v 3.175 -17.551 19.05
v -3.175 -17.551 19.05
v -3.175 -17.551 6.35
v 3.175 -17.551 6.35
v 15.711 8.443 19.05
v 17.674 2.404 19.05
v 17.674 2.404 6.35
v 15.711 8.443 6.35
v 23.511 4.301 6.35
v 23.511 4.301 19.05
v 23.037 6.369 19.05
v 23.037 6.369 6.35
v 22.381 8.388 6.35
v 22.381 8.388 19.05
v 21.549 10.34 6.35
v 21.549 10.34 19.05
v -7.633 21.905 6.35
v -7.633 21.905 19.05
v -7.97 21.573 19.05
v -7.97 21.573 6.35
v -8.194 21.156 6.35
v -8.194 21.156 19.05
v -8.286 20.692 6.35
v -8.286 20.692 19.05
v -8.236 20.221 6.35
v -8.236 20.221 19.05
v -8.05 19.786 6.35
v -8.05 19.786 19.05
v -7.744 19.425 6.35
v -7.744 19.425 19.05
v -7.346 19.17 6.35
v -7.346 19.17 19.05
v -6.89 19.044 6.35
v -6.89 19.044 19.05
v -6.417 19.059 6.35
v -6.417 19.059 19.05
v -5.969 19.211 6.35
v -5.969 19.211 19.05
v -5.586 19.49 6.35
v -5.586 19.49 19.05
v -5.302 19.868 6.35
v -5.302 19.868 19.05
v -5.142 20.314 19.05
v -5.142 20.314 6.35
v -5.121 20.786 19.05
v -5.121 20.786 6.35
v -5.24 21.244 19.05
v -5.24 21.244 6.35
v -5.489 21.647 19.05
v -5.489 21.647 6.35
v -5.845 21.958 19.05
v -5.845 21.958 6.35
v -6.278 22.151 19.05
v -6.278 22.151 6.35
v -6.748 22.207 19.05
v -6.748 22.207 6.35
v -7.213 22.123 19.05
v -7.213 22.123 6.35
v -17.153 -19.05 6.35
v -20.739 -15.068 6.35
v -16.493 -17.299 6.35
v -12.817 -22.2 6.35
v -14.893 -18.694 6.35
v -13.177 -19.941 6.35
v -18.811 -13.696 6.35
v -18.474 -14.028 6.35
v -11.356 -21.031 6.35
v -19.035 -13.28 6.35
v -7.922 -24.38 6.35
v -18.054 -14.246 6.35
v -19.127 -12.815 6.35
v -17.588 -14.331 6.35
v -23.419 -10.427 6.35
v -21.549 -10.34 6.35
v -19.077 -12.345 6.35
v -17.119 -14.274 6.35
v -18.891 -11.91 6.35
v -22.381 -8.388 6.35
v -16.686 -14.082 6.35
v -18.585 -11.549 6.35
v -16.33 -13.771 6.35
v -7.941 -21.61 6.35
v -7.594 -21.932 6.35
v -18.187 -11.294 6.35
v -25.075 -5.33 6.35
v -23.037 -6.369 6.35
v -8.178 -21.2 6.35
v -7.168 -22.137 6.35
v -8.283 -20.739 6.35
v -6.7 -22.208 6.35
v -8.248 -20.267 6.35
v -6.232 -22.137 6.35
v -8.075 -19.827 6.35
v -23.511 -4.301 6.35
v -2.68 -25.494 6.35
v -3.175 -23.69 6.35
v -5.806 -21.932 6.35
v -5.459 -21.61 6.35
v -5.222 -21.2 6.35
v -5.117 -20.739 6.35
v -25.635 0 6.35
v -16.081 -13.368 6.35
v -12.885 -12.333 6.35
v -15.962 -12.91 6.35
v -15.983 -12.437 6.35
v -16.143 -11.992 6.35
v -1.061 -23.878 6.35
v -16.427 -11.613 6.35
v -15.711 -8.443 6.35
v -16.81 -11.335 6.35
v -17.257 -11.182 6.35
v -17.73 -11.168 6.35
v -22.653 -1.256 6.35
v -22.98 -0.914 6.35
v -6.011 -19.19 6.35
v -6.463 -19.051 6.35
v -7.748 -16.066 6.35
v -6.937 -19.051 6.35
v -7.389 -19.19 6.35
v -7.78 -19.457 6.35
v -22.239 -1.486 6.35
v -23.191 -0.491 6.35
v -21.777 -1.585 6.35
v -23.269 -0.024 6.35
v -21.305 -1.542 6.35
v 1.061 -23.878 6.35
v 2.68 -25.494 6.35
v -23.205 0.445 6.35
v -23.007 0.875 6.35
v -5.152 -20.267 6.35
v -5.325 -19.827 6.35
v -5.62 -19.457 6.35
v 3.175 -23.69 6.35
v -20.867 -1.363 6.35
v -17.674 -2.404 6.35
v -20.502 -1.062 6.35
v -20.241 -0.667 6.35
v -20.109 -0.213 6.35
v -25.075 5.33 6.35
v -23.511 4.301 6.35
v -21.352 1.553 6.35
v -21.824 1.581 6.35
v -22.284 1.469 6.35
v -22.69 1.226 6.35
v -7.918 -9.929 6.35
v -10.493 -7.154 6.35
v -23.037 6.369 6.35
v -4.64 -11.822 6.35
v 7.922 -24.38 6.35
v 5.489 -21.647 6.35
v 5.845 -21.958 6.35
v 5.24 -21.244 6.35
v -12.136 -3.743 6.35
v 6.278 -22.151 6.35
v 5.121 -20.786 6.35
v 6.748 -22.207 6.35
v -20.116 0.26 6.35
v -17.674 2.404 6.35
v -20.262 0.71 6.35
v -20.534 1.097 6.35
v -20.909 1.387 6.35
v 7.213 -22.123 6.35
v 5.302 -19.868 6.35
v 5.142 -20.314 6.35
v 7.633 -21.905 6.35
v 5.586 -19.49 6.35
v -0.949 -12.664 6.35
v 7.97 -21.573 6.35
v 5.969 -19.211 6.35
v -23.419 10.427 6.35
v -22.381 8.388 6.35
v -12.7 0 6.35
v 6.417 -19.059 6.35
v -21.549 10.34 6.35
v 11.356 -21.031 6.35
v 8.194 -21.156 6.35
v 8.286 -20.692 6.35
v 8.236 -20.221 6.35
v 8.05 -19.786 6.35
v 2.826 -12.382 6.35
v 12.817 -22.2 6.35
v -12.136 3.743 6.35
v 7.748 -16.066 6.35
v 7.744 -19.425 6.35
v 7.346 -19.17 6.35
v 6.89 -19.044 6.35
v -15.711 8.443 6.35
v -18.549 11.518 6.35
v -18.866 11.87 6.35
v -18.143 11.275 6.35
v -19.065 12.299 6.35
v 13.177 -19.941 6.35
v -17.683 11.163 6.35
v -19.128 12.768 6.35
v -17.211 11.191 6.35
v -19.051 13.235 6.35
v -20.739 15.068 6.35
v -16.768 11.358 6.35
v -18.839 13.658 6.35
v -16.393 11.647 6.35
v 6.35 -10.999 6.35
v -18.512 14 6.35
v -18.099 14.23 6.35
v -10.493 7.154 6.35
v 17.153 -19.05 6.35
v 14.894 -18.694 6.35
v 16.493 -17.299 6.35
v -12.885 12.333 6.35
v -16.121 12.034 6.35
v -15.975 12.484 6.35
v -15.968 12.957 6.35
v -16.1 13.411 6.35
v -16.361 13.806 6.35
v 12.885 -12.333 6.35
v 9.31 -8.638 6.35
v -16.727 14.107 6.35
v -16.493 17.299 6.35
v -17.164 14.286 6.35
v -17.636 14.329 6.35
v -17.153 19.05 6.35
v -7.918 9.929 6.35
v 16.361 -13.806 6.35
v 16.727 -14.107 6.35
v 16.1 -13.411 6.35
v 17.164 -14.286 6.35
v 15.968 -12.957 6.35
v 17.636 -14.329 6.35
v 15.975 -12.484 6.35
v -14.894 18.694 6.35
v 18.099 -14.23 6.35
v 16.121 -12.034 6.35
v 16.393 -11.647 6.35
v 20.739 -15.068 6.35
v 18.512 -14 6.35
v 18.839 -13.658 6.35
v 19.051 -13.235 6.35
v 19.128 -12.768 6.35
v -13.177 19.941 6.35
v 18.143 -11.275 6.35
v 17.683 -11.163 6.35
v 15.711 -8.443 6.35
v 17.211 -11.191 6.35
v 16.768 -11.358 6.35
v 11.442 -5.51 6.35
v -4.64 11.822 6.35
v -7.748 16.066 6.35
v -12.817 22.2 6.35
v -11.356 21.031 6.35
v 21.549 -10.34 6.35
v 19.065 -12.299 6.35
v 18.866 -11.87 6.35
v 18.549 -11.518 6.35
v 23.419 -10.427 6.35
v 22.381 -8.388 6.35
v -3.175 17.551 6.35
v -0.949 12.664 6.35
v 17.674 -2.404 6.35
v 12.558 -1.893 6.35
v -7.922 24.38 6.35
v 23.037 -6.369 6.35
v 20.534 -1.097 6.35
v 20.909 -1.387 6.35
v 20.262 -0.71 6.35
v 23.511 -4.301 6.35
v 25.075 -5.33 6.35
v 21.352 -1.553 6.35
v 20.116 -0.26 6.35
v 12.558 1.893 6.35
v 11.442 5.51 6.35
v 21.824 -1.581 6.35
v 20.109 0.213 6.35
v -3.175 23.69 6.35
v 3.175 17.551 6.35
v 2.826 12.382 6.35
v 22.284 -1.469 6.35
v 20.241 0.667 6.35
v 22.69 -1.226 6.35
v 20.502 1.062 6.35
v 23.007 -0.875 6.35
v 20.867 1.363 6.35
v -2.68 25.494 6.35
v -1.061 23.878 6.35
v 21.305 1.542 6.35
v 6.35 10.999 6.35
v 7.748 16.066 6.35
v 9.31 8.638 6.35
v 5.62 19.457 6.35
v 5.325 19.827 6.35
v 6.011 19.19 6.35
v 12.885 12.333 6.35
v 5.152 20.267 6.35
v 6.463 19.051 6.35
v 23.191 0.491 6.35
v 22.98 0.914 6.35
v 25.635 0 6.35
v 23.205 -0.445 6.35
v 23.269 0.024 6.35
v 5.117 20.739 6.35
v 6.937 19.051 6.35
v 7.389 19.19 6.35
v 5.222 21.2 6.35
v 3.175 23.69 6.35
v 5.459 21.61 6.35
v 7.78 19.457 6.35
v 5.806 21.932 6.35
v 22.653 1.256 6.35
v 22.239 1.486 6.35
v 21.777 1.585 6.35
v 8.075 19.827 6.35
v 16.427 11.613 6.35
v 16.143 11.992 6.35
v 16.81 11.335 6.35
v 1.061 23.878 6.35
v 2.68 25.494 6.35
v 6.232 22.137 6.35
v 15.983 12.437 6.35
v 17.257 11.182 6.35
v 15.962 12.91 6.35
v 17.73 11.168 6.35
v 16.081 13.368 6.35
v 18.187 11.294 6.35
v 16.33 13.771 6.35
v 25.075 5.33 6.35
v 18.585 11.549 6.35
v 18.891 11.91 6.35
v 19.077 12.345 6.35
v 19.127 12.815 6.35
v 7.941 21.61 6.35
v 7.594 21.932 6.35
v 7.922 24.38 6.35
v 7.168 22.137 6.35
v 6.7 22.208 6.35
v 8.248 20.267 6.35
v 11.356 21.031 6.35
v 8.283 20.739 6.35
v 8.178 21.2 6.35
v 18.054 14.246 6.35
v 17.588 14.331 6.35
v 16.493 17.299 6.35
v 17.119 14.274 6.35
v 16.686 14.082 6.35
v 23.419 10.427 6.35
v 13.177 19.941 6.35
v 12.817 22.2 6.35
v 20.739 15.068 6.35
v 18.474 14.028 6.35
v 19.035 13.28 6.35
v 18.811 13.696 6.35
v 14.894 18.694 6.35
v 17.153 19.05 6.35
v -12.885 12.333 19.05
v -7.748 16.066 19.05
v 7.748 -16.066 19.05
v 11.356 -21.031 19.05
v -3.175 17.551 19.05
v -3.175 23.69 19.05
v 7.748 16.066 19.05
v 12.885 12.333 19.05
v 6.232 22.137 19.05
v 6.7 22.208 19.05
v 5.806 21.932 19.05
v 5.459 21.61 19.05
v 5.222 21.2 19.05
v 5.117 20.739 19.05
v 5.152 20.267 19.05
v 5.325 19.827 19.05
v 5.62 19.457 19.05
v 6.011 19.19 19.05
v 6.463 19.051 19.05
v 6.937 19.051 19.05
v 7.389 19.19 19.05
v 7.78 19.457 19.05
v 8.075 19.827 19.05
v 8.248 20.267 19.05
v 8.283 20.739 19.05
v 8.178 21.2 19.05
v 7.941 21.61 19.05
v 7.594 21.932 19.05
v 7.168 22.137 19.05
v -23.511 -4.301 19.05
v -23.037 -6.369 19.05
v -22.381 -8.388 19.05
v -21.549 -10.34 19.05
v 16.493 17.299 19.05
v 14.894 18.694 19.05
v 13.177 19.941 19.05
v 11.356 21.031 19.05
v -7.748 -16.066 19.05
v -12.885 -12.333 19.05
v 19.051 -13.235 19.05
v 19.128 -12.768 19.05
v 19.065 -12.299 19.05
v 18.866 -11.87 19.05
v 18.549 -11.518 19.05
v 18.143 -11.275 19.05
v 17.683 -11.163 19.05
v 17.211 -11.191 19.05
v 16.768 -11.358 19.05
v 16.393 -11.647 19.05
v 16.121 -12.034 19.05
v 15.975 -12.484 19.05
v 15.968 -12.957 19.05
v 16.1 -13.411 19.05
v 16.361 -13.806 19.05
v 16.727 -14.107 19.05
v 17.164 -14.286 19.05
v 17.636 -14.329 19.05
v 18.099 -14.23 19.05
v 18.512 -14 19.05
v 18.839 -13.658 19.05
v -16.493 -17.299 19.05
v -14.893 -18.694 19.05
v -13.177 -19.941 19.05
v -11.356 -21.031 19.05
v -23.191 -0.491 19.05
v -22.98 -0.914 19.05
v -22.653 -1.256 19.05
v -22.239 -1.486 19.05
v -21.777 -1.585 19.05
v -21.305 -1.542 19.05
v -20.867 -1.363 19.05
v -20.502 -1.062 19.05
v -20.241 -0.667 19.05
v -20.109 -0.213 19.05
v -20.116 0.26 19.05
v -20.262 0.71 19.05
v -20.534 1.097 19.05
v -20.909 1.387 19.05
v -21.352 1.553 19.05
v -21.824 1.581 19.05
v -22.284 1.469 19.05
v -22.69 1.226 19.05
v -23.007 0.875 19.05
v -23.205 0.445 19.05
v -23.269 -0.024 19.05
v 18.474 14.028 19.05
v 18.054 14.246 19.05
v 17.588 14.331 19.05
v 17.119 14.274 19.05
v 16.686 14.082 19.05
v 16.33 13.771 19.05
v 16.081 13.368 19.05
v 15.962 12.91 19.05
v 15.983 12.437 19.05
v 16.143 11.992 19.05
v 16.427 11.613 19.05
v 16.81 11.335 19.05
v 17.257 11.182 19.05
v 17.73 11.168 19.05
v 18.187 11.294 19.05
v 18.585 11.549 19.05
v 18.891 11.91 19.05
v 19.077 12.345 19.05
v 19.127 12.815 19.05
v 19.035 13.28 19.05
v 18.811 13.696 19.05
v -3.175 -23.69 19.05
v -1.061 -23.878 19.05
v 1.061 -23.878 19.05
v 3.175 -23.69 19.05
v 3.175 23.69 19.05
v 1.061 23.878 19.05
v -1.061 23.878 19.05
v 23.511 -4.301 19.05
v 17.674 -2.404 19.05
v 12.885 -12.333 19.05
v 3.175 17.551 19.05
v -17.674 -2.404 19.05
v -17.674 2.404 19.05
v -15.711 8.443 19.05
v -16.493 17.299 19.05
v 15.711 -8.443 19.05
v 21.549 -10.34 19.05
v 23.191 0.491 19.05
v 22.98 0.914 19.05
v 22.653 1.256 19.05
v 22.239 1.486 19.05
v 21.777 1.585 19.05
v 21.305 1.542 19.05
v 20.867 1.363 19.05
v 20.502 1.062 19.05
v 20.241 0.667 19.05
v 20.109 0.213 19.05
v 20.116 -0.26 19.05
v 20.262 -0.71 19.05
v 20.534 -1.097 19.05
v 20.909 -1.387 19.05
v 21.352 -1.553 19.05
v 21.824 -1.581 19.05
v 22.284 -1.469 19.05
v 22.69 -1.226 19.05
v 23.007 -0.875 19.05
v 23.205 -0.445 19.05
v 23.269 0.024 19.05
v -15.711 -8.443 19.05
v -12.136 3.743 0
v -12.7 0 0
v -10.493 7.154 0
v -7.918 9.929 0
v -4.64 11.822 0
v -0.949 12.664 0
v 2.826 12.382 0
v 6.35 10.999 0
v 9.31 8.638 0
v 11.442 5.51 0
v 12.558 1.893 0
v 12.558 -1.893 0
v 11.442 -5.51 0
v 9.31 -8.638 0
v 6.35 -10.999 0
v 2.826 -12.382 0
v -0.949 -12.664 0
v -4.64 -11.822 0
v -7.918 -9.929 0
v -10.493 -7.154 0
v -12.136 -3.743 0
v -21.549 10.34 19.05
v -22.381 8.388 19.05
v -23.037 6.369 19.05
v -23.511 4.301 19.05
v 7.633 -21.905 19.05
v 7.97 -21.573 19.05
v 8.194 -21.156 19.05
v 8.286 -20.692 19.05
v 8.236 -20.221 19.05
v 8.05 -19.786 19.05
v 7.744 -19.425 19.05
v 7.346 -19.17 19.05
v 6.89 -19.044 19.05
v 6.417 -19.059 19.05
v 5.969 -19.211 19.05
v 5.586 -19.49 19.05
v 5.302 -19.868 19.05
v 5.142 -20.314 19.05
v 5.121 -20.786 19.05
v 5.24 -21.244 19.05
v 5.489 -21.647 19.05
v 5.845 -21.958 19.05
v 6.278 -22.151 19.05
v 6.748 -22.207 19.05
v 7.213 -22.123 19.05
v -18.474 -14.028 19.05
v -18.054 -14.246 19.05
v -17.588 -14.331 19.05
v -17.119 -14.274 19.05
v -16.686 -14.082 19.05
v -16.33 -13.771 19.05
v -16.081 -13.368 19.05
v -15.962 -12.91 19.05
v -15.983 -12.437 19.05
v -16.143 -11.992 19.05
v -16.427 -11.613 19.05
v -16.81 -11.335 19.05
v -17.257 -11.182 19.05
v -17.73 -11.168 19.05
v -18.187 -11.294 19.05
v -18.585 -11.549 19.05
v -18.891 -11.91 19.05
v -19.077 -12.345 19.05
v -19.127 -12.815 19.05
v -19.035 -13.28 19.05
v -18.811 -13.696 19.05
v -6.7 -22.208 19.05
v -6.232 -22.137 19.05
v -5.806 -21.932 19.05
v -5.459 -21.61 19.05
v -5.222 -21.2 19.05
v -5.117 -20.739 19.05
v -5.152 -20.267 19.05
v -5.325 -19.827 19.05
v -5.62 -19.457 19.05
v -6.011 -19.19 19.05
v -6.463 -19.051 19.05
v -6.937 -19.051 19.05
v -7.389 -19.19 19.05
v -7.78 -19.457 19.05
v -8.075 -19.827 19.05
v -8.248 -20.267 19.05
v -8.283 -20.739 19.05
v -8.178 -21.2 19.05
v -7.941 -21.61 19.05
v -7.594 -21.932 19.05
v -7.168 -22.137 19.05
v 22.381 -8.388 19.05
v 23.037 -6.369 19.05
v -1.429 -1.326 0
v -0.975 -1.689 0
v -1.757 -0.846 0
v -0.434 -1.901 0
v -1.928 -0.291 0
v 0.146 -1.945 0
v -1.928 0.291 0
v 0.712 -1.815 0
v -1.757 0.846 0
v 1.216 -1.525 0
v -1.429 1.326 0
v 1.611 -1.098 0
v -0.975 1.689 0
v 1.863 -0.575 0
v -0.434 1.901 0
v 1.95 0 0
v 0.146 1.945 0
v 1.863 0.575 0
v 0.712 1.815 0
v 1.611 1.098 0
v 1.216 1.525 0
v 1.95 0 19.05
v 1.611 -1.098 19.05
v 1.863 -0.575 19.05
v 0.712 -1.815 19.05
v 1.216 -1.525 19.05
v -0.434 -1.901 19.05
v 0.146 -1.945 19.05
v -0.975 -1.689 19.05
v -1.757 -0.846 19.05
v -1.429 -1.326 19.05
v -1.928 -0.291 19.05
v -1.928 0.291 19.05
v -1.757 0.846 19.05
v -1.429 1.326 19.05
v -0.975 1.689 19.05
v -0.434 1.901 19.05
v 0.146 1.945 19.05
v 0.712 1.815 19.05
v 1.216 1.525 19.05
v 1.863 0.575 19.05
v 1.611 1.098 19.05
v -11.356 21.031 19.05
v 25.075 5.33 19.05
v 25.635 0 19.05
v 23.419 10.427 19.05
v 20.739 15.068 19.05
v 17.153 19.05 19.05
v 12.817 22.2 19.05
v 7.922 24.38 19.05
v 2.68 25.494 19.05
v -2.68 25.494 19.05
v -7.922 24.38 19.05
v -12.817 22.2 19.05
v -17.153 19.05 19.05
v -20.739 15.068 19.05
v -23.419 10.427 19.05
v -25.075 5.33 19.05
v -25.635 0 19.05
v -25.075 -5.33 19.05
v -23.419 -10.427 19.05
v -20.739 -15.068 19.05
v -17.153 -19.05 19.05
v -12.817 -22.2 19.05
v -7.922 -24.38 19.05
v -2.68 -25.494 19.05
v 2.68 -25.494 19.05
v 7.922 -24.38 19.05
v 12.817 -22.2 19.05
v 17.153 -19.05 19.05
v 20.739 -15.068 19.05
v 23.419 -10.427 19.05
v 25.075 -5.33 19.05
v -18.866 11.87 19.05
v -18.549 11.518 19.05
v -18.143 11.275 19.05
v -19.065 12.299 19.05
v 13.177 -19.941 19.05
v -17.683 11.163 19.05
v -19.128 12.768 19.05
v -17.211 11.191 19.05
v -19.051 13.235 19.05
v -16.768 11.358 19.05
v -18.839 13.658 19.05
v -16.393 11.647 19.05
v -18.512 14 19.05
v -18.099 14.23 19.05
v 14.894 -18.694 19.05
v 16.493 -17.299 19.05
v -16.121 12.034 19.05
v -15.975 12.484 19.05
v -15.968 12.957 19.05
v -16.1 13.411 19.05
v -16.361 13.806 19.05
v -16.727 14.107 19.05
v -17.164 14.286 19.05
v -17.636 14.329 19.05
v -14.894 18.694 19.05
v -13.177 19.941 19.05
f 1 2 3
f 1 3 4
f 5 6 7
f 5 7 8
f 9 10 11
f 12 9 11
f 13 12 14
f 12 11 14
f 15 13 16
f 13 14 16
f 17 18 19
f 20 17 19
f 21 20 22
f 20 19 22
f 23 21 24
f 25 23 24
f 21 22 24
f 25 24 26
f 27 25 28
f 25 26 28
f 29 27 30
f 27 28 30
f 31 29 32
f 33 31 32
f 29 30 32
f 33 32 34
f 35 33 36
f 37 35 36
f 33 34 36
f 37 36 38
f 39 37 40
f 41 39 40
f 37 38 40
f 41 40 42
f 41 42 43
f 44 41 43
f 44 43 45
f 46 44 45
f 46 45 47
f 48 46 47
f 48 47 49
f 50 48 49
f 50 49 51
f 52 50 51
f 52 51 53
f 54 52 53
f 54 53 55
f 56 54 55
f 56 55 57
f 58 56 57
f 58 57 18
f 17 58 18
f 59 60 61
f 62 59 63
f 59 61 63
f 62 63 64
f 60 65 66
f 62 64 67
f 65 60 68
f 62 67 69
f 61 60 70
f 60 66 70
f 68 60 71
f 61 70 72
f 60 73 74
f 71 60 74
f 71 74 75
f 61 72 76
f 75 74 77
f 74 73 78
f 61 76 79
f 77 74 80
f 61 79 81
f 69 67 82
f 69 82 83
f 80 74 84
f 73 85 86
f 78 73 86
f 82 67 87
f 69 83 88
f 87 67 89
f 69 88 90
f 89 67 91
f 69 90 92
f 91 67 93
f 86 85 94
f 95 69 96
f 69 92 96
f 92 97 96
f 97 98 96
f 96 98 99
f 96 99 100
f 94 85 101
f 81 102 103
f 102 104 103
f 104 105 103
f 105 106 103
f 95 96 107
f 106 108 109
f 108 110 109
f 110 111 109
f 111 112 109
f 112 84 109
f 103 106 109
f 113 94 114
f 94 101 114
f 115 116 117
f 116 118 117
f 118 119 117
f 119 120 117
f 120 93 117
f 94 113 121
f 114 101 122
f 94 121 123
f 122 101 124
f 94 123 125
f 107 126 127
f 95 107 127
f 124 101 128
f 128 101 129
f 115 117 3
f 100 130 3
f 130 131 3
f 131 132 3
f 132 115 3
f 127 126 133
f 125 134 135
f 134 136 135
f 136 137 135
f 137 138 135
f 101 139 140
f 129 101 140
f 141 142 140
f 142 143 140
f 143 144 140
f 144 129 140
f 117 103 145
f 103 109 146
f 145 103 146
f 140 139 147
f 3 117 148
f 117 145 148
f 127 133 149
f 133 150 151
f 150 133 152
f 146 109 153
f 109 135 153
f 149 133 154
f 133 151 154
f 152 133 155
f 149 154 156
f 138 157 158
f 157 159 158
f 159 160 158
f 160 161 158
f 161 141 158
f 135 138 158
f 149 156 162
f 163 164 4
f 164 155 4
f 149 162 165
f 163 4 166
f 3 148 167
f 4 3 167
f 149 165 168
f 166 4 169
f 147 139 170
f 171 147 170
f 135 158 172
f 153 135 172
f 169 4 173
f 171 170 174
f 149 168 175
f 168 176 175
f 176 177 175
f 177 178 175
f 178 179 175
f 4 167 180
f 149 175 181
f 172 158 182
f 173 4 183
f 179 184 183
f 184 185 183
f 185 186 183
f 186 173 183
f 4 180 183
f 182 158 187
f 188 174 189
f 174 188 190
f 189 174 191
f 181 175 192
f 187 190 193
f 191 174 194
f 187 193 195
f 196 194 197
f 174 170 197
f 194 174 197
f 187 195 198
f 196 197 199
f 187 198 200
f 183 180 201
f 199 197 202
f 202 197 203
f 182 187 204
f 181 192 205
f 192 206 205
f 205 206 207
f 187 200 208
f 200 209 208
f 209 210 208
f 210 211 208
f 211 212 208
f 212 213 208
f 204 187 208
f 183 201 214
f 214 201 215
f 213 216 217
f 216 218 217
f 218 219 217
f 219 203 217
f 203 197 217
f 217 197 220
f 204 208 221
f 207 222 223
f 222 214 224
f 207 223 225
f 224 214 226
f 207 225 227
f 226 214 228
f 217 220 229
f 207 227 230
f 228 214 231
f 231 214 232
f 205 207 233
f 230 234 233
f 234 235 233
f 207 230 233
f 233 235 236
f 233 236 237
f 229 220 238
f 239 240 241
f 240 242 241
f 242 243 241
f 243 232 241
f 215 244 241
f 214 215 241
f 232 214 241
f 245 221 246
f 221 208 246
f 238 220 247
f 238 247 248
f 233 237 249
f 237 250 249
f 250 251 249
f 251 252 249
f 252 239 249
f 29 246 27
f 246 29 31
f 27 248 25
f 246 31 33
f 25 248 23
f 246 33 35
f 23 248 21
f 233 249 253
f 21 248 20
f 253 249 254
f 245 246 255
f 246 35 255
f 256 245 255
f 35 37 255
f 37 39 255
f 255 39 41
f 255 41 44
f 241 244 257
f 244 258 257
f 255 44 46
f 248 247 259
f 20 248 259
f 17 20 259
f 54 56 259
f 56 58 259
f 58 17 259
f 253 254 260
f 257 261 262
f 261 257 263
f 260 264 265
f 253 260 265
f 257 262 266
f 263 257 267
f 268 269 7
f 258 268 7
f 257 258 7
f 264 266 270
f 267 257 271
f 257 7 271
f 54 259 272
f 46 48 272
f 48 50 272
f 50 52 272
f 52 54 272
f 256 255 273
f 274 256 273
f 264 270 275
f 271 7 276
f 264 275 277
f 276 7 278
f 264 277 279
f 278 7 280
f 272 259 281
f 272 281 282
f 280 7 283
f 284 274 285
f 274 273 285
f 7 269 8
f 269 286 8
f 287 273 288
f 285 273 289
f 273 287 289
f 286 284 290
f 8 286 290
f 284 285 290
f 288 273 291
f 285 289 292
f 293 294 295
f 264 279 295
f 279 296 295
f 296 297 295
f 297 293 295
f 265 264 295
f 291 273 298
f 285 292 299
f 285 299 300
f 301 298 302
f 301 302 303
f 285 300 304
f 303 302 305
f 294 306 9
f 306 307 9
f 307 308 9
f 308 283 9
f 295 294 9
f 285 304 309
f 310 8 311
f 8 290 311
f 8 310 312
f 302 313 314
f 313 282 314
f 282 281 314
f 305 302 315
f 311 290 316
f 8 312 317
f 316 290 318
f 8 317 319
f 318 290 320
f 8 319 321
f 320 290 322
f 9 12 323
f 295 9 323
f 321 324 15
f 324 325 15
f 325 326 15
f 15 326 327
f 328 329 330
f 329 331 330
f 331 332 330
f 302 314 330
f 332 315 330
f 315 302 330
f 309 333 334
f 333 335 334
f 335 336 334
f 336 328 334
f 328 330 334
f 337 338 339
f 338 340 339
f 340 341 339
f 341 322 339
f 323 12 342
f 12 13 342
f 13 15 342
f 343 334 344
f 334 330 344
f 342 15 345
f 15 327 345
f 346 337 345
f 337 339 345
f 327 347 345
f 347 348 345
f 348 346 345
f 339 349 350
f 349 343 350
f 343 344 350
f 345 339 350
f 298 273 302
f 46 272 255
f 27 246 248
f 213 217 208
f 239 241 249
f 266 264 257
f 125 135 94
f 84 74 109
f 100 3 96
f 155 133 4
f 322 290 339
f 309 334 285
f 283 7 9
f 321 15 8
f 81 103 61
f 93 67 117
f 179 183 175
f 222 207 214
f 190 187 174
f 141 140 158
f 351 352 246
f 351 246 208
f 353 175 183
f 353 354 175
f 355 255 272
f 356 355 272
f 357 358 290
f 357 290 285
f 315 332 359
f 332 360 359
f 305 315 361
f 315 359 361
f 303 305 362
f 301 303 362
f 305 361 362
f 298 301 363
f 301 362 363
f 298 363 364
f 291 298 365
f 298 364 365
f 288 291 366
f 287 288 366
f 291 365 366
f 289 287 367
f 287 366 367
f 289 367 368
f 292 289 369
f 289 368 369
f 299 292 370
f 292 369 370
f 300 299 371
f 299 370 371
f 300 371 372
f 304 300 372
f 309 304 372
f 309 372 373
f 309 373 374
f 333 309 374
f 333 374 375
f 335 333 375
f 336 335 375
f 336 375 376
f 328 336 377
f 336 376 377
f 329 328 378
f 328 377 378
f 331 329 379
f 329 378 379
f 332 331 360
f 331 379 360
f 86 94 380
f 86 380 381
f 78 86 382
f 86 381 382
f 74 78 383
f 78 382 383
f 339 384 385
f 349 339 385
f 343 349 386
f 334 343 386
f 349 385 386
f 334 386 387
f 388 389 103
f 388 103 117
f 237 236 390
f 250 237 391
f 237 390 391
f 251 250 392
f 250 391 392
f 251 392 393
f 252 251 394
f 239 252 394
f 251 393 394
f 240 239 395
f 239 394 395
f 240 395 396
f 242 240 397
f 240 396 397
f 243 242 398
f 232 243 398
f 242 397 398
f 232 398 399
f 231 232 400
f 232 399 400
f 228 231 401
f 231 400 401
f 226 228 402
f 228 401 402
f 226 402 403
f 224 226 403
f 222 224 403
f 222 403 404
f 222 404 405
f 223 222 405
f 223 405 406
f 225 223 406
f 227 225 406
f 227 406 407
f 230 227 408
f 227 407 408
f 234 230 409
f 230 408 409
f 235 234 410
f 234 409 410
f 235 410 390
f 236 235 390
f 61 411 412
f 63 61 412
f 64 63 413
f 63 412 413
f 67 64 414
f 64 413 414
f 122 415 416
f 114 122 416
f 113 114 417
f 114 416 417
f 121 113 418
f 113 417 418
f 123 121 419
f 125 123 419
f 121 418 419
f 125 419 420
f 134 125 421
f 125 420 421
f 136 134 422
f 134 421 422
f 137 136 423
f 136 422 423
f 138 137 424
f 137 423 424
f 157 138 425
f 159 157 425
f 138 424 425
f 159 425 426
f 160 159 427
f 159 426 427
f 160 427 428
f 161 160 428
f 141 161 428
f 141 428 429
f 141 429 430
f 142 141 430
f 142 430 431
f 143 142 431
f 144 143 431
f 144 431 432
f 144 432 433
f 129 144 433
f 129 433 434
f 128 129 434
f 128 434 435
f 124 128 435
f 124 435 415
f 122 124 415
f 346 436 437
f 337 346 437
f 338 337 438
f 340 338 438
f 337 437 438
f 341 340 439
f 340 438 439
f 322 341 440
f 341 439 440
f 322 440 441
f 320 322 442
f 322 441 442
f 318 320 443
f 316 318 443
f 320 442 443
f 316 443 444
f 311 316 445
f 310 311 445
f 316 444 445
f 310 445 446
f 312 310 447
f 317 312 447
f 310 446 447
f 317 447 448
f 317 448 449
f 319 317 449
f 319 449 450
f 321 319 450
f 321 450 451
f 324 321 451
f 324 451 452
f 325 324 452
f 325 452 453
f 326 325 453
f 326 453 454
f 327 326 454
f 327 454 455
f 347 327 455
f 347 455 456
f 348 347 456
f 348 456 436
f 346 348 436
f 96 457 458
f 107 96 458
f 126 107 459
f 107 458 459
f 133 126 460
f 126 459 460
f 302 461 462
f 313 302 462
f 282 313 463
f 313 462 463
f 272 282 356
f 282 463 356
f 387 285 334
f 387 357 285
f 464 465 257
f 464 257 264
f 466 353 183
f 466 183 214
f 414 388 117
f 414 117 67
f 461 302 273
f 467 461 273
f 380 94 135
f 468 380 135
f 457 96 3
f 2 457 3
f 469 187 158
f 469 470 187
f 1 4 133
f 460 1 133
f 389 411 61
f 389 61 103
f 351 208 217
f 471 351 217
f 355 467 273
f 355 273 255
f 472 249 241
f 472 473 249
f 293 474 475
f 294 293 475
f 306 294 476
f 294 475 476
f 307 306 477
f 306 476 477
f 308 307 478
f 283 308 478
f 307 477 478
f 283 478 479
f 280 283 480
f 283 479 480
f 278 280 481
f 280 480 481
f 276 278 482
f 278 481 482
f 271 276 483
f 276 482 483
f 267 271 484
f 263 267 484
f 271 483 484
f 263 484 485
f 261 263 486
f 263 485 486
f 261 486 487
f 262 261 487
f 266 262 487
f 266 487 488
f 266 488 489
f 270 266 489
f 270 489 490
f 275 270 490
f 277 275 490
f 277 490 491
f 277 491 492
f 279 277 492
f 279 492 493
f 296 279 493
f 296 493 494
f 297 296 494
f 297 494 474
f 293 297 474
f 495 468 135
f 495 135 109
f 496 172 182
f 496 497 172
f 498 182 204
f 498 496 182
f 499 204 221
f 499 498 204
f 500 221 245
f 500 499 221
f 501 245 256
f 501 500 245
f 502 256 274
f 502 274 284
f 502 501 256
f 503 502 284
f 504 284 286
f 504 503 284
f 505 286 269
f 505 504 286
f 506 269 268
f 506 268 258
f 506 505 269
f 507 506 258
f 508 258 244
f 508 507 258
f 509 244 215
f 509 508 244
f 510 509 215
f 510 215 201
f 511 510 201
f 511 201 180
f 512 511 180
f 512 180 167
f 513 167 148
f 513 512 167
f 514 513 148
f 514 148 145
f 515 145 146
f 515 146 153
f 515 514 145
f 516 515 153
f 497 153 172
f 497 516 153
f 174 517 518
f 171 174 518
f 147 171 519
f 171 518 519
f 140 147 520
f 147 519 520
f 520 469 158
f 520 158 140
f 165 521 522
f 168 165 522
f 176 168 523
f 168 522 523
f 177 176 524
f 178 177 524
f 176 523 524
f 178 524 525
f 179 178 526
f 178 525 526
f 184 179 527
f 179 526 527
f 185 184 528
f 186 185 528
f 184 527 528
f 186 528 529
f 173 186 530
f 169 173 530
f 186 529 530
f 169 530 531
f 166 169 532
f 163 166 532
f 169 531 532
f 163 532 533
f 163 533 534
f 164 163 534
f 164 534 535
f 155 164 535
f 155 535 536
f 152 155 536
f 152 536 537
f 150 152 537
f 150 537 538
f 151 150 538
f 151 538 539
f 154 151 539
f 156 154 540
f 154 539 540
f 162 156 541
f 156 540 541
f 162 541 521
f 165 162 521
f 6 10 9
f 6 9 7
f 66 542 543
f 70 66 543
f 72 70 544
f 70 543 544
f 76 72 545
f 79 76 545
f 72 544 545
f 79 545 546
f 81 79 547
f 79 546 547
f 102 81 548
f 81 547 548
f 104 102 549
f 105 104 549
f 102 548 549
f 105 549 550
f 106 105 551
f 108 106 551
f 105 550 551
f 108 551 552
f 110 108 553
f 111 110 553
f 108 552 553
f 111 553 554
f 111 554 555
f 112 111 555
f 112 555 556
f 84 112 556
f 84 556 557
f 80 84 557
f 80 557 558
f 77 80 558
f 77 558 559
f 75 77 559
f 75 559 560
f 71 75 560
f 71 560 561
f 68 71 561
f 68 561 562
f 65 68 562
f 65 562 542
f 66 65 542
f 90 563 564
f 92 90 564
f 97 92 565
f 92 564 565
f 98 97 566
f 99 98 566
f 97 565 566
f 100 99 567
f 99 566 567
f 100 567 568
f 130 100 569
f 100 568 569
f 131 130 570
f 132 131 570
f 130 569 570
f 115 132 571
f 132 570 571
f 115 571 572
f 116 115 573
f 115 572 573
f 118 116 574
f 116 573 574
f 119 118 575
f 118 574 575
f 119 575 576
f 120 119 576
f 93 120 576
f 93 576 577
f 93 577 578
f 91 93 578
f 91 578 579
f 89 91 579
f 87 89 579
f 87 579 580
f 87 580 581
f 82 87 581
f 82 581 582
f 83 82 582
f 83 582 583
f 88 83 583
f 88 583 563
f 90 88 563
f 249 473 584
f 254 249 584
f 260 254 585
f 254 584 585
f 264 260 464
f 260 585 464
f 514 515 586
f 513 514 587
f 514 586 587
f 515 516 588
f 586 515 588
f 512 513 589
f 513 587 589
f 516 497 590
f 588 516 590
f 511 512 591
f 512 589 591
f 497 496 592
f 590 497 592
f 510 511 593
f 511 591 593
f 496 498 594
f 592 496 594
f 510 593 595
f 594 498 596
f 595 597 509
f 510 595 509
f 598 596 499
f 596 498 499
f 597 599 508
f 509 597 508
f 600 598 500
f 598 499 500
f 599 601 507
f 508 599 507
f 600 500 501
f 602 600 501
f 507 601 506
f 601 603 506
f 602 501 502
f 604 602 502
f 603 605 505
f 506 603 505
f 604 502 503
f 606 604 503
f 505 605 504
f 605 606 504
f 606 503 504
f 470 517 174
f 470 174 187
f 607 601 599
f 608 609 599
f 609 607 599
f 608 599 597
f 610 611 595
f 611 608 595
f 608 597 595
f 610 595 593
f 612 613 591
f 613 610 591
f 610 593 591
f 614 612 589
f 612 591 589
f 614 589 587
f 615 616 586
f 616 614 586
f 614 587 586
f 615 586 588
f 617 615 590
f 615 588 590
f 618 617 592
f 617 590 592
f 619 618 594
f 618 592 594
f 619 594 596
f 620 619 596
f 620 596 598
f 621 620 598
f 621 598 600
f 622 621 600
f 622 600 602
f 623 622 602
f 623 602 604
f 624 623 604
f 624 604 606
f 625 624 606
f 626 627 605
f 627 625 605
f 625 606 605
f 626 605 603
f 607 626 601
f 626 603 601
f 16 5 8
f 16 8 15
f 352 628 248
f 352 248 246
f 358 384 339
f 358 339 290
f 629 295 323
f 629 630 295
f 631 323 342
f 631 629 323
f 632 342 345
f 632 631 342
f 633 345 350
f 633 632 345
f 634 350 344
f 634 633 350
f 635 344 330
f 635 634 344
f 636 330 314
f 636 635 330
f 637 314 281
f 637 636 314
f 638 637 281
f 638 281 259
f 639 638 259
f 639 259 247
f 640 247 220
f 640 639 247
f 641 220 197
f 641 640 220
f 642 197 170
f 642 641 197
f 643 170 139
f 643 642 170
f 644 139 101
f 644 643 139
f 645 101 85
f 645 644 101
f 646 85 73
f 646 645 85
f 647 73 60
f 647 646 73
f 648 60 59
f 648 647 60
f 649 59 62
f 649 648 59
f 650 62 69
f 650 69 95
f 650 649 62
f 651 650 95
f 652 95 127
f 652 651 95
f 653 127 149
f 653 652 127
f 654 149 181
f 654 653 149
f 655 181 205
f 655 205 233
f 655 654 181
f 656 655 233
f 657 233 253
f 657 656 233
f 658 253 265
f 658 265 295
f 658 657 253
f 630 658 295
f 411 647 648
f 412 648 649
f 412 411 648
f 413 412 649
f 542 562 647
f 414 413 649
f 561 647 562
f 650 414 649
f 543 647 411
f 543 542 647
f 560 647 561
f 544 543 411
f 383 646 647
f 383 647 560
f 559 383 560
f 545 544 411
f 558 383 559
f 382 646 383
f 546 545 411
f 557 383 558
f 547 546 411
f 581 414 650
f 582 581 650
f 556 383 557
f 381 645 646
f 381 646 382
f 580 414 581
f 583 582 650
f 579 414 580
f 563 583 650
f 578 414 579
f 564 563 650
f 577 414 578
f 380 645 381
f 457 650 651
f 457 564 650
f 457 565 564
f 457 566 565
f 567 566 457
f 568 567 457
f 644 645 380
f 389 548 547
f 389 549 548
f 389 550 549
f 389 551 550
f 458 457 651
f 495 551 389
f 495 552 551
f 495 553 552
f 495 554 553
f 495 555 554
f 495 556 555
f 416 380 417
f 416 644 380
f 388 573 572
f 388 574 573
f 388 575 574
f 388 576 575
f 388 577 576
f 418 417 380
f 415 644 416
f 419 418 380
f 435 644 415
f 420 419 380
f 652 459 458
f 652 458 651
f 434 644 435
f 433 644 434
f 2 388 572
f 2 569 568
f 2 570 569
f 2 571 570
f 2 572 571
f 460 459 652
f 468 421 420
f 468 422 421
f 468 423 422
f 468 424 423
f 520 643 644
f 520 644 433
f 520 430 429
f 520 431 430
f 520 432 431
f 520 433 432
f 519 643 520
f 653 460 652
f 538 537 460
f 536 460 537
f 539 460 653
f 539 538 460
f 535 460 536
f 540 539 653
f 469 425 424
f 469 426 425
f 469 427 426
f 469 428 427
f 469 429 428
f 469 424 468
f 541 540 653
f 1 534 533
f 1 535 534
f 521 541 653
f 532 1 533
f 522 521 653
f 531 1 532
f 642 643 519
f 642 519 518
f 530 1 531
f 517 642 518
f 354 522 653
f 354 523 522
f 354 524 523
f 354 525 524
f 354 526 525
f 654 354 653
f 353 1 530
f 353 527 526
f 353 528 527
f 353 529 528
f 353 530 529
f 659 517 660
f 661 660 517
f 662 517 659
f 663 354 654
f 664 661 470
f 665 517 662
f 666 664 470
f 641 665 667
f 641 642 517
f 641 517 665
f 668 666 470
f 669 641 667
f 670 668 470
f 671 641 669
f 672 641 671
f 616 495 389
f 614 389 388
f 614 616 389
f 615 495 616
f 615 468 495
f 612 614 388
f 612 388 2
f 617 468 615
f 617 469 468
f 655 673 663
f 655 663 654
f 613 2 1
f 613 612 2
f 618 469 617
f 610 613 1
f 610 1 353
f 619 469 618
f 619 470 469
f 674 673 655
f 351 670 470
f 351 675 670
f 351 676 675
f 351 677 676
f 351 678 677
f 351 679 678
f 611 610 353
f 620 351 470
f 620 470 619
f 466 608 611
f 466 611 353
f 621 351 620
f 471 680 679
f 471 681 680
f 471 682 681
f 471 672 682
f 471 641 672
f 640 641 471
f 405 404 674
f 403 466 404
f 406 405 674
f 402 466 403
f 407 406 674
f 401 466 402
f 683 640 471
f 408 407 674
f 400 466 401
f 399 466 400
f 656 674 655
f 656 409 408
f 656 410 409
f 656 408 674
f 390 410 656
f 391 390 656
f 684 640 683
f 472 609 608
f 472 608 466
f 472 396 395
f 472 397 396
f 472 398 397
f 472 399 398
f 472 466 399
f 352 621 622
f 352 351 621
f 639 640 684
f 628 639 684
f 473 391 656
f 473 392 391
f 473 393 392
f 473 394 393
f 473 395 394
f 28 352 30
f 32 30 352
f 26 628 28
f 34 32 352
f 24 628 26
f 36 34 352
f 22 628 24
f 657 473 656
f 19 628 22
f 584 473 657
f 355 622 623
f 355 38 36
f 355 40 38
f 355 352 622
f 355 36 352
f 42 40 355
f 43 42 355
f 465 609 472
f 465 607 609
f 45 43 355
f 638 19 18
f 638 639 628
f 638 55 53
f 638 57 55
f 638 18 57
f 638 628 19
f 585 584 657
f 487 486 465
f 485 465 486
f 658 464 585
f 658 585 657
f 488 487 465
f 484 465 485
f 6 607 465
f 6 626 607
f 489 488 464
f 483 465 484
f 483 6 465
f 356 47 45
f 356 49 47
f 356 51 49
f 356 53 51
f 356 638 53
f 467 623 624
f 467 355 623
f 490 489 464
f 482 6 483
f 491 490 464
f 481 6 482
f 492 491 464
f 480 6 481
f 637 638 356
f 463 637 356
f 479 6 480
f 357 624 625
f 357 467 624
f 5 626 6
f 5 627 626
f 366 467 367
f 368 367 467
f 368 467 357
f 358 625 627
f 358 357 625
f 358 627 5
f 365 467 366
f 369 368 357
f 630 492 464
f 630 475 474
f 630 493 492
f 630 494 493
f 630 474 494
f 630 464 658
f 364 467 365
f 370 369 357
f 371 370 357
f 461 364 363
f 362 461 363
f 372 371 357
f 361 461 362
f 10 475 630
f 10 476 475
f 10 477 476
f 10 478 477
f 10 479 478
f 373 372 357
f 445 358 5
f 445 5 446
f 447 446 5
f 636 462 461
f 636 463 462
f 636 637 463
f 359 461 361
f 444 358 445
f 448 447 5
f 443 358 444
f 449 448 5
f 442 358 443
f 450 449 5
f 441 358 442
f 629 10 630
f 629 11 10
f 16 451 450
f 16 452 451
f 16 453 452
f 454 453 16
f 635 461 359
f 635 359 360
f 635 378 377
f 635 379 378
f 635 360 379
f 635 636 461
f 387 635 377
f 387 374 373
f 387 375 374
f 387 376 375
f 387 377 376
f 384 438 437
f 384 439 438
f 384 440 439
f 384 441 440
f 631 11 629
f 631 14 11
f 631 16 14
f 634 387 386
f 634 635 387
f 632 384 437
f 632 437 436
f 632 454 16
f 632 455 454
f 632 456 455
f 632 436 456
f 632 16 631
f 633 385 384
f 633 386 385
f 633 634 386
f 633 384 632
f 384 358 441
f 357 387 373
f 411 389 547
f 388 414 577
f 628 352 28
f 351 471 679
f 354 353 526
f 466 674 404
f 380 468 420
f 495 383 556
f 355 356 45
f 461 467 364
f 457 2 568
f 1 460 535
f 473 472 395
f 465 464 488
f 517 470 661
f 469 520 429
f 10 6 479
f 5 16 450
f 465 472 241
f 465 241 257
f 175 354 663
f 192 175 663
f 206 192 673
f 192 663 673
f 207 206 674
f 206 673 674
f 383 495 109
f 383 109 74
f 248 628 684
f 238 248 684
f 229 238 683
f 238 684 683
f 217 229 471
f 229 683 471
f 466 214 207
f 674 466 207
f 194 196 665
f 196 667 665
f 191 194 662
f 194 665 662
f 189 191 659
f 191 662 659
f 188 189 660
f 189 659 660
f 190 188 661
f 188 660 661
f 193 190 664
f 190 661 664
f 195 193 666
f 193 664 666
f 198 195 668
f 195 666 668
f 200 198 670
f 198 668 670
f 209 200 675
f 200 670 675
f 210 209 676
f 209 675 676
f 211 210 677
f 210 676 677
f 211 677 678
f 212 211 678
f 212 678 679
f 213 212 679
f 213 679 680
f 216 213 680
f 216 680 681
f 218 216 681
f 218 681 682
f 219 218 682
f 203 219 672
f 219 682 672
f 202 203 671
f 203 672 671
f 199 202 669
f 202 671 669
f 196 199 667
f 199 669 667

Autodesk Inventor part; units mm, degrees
ref_plane "YZ Plane" through (0, 0, 0) normal (1, 0, 0) x (0, 1, 0)
ref_plane "XZ Plane" through (0, 0, 0) normal (0, 1, 0) x (-1, 0, 0)
ref_plane "XY Plane" through (0, 0, 0) normal (0, 0, 1) x (1, 0, 0)
sketch "Sketch1" plane through (0, 0, 0) normal (0, 0, 1) x (1, 0, 0)
  circle A0 centre (0, 0) radius 1.95 projected
  circle A1 centre (0, 0) radius 23.9014
  point P0 (0, 0)
  dimension "d0" = 47.8028
extrude "Extrusion1" add sketch "Sketch1" along normal blind 19.05
sketch "Sketch2" plane through (0, 0, 0) normal (0, 0, -1) x (-1, 0, 0)
  circle A0 centre (0, 0) radius 1.95 projected
  circle A1 centre (0, 0) radius 23.9014 projected
  circle A2 centre (0, 0) radius 12.7
  dimension "d3" = 25.4
extrude "Extrusion2" cut sketch "Sketch2" against normal blind 6.35 contours A1
sketch "Sketch3" plane through (0, 0, 19.05) normal (0, 0, 1) x (1, 0, 0)
  circle A0 centre (0, 0) radius 23.9014 projected
  line L0 (-3.175, -17.5514) -> (3.175, -17.5514)
  line L1 (3.175, -17.5514) -> (3.175, -23.9014)
  line L2 (3.175, -23.9014) -> (-3.175, -23.9014)
  line L3 (-3.175, -23.9014) -> (-3.175, -17.5514)
  line L4 (0, 0) -> (0, -27.6264) construction
  point P0 (0, -17.5514)
  dimension "d6" = 6.35
  dimension "d7" = 6.35
extrude "Extrusion3" cut sketch "Sketch3" against normal blind 12.7 contours L3 L0 L1 A0 | A0 L2 L3 | L1 L2 A0 picked at (0, -19.6681)
pattern_circular "Circular Pattern1" count 10 over 360 about axis through (0, 0, 0) along (0, 0, 1) of "Extrusion3"
sketch "Sketch4" plane through (0, 0, 19.05) normal (0, 0, 1) x (1, 0, 0)
  arc A0 (-21.549, -10.3401) -> (-16.493, -17.2991) centre (0, 0) ccw projected
  circle A1 centre (0, 0) radius 23.9014
  circle A2 centre (0, 0) radius 25.6348
extrude "Extrusion4" add sketch "Sketch4" against normal blind 12.7
sketch "Sketch5" plane through (0, 0, 6.35) normal (0, 0, -1) x (-1, 0, 0)
  point P0 (-6.7, 20.6205)
hole "Hole1" at (6.7, 20.6205, 6.35) direction (0, 0, 1) diameter 3.175 depth 25.4 tip angle 118
pattern_circular "Circular Pattern2" count 10 over 360 about axis through (0, 0, 0) along (0, 0, 1) of "Hole1"
properties part number "driveWheel01" material "Wood (Maple)"
